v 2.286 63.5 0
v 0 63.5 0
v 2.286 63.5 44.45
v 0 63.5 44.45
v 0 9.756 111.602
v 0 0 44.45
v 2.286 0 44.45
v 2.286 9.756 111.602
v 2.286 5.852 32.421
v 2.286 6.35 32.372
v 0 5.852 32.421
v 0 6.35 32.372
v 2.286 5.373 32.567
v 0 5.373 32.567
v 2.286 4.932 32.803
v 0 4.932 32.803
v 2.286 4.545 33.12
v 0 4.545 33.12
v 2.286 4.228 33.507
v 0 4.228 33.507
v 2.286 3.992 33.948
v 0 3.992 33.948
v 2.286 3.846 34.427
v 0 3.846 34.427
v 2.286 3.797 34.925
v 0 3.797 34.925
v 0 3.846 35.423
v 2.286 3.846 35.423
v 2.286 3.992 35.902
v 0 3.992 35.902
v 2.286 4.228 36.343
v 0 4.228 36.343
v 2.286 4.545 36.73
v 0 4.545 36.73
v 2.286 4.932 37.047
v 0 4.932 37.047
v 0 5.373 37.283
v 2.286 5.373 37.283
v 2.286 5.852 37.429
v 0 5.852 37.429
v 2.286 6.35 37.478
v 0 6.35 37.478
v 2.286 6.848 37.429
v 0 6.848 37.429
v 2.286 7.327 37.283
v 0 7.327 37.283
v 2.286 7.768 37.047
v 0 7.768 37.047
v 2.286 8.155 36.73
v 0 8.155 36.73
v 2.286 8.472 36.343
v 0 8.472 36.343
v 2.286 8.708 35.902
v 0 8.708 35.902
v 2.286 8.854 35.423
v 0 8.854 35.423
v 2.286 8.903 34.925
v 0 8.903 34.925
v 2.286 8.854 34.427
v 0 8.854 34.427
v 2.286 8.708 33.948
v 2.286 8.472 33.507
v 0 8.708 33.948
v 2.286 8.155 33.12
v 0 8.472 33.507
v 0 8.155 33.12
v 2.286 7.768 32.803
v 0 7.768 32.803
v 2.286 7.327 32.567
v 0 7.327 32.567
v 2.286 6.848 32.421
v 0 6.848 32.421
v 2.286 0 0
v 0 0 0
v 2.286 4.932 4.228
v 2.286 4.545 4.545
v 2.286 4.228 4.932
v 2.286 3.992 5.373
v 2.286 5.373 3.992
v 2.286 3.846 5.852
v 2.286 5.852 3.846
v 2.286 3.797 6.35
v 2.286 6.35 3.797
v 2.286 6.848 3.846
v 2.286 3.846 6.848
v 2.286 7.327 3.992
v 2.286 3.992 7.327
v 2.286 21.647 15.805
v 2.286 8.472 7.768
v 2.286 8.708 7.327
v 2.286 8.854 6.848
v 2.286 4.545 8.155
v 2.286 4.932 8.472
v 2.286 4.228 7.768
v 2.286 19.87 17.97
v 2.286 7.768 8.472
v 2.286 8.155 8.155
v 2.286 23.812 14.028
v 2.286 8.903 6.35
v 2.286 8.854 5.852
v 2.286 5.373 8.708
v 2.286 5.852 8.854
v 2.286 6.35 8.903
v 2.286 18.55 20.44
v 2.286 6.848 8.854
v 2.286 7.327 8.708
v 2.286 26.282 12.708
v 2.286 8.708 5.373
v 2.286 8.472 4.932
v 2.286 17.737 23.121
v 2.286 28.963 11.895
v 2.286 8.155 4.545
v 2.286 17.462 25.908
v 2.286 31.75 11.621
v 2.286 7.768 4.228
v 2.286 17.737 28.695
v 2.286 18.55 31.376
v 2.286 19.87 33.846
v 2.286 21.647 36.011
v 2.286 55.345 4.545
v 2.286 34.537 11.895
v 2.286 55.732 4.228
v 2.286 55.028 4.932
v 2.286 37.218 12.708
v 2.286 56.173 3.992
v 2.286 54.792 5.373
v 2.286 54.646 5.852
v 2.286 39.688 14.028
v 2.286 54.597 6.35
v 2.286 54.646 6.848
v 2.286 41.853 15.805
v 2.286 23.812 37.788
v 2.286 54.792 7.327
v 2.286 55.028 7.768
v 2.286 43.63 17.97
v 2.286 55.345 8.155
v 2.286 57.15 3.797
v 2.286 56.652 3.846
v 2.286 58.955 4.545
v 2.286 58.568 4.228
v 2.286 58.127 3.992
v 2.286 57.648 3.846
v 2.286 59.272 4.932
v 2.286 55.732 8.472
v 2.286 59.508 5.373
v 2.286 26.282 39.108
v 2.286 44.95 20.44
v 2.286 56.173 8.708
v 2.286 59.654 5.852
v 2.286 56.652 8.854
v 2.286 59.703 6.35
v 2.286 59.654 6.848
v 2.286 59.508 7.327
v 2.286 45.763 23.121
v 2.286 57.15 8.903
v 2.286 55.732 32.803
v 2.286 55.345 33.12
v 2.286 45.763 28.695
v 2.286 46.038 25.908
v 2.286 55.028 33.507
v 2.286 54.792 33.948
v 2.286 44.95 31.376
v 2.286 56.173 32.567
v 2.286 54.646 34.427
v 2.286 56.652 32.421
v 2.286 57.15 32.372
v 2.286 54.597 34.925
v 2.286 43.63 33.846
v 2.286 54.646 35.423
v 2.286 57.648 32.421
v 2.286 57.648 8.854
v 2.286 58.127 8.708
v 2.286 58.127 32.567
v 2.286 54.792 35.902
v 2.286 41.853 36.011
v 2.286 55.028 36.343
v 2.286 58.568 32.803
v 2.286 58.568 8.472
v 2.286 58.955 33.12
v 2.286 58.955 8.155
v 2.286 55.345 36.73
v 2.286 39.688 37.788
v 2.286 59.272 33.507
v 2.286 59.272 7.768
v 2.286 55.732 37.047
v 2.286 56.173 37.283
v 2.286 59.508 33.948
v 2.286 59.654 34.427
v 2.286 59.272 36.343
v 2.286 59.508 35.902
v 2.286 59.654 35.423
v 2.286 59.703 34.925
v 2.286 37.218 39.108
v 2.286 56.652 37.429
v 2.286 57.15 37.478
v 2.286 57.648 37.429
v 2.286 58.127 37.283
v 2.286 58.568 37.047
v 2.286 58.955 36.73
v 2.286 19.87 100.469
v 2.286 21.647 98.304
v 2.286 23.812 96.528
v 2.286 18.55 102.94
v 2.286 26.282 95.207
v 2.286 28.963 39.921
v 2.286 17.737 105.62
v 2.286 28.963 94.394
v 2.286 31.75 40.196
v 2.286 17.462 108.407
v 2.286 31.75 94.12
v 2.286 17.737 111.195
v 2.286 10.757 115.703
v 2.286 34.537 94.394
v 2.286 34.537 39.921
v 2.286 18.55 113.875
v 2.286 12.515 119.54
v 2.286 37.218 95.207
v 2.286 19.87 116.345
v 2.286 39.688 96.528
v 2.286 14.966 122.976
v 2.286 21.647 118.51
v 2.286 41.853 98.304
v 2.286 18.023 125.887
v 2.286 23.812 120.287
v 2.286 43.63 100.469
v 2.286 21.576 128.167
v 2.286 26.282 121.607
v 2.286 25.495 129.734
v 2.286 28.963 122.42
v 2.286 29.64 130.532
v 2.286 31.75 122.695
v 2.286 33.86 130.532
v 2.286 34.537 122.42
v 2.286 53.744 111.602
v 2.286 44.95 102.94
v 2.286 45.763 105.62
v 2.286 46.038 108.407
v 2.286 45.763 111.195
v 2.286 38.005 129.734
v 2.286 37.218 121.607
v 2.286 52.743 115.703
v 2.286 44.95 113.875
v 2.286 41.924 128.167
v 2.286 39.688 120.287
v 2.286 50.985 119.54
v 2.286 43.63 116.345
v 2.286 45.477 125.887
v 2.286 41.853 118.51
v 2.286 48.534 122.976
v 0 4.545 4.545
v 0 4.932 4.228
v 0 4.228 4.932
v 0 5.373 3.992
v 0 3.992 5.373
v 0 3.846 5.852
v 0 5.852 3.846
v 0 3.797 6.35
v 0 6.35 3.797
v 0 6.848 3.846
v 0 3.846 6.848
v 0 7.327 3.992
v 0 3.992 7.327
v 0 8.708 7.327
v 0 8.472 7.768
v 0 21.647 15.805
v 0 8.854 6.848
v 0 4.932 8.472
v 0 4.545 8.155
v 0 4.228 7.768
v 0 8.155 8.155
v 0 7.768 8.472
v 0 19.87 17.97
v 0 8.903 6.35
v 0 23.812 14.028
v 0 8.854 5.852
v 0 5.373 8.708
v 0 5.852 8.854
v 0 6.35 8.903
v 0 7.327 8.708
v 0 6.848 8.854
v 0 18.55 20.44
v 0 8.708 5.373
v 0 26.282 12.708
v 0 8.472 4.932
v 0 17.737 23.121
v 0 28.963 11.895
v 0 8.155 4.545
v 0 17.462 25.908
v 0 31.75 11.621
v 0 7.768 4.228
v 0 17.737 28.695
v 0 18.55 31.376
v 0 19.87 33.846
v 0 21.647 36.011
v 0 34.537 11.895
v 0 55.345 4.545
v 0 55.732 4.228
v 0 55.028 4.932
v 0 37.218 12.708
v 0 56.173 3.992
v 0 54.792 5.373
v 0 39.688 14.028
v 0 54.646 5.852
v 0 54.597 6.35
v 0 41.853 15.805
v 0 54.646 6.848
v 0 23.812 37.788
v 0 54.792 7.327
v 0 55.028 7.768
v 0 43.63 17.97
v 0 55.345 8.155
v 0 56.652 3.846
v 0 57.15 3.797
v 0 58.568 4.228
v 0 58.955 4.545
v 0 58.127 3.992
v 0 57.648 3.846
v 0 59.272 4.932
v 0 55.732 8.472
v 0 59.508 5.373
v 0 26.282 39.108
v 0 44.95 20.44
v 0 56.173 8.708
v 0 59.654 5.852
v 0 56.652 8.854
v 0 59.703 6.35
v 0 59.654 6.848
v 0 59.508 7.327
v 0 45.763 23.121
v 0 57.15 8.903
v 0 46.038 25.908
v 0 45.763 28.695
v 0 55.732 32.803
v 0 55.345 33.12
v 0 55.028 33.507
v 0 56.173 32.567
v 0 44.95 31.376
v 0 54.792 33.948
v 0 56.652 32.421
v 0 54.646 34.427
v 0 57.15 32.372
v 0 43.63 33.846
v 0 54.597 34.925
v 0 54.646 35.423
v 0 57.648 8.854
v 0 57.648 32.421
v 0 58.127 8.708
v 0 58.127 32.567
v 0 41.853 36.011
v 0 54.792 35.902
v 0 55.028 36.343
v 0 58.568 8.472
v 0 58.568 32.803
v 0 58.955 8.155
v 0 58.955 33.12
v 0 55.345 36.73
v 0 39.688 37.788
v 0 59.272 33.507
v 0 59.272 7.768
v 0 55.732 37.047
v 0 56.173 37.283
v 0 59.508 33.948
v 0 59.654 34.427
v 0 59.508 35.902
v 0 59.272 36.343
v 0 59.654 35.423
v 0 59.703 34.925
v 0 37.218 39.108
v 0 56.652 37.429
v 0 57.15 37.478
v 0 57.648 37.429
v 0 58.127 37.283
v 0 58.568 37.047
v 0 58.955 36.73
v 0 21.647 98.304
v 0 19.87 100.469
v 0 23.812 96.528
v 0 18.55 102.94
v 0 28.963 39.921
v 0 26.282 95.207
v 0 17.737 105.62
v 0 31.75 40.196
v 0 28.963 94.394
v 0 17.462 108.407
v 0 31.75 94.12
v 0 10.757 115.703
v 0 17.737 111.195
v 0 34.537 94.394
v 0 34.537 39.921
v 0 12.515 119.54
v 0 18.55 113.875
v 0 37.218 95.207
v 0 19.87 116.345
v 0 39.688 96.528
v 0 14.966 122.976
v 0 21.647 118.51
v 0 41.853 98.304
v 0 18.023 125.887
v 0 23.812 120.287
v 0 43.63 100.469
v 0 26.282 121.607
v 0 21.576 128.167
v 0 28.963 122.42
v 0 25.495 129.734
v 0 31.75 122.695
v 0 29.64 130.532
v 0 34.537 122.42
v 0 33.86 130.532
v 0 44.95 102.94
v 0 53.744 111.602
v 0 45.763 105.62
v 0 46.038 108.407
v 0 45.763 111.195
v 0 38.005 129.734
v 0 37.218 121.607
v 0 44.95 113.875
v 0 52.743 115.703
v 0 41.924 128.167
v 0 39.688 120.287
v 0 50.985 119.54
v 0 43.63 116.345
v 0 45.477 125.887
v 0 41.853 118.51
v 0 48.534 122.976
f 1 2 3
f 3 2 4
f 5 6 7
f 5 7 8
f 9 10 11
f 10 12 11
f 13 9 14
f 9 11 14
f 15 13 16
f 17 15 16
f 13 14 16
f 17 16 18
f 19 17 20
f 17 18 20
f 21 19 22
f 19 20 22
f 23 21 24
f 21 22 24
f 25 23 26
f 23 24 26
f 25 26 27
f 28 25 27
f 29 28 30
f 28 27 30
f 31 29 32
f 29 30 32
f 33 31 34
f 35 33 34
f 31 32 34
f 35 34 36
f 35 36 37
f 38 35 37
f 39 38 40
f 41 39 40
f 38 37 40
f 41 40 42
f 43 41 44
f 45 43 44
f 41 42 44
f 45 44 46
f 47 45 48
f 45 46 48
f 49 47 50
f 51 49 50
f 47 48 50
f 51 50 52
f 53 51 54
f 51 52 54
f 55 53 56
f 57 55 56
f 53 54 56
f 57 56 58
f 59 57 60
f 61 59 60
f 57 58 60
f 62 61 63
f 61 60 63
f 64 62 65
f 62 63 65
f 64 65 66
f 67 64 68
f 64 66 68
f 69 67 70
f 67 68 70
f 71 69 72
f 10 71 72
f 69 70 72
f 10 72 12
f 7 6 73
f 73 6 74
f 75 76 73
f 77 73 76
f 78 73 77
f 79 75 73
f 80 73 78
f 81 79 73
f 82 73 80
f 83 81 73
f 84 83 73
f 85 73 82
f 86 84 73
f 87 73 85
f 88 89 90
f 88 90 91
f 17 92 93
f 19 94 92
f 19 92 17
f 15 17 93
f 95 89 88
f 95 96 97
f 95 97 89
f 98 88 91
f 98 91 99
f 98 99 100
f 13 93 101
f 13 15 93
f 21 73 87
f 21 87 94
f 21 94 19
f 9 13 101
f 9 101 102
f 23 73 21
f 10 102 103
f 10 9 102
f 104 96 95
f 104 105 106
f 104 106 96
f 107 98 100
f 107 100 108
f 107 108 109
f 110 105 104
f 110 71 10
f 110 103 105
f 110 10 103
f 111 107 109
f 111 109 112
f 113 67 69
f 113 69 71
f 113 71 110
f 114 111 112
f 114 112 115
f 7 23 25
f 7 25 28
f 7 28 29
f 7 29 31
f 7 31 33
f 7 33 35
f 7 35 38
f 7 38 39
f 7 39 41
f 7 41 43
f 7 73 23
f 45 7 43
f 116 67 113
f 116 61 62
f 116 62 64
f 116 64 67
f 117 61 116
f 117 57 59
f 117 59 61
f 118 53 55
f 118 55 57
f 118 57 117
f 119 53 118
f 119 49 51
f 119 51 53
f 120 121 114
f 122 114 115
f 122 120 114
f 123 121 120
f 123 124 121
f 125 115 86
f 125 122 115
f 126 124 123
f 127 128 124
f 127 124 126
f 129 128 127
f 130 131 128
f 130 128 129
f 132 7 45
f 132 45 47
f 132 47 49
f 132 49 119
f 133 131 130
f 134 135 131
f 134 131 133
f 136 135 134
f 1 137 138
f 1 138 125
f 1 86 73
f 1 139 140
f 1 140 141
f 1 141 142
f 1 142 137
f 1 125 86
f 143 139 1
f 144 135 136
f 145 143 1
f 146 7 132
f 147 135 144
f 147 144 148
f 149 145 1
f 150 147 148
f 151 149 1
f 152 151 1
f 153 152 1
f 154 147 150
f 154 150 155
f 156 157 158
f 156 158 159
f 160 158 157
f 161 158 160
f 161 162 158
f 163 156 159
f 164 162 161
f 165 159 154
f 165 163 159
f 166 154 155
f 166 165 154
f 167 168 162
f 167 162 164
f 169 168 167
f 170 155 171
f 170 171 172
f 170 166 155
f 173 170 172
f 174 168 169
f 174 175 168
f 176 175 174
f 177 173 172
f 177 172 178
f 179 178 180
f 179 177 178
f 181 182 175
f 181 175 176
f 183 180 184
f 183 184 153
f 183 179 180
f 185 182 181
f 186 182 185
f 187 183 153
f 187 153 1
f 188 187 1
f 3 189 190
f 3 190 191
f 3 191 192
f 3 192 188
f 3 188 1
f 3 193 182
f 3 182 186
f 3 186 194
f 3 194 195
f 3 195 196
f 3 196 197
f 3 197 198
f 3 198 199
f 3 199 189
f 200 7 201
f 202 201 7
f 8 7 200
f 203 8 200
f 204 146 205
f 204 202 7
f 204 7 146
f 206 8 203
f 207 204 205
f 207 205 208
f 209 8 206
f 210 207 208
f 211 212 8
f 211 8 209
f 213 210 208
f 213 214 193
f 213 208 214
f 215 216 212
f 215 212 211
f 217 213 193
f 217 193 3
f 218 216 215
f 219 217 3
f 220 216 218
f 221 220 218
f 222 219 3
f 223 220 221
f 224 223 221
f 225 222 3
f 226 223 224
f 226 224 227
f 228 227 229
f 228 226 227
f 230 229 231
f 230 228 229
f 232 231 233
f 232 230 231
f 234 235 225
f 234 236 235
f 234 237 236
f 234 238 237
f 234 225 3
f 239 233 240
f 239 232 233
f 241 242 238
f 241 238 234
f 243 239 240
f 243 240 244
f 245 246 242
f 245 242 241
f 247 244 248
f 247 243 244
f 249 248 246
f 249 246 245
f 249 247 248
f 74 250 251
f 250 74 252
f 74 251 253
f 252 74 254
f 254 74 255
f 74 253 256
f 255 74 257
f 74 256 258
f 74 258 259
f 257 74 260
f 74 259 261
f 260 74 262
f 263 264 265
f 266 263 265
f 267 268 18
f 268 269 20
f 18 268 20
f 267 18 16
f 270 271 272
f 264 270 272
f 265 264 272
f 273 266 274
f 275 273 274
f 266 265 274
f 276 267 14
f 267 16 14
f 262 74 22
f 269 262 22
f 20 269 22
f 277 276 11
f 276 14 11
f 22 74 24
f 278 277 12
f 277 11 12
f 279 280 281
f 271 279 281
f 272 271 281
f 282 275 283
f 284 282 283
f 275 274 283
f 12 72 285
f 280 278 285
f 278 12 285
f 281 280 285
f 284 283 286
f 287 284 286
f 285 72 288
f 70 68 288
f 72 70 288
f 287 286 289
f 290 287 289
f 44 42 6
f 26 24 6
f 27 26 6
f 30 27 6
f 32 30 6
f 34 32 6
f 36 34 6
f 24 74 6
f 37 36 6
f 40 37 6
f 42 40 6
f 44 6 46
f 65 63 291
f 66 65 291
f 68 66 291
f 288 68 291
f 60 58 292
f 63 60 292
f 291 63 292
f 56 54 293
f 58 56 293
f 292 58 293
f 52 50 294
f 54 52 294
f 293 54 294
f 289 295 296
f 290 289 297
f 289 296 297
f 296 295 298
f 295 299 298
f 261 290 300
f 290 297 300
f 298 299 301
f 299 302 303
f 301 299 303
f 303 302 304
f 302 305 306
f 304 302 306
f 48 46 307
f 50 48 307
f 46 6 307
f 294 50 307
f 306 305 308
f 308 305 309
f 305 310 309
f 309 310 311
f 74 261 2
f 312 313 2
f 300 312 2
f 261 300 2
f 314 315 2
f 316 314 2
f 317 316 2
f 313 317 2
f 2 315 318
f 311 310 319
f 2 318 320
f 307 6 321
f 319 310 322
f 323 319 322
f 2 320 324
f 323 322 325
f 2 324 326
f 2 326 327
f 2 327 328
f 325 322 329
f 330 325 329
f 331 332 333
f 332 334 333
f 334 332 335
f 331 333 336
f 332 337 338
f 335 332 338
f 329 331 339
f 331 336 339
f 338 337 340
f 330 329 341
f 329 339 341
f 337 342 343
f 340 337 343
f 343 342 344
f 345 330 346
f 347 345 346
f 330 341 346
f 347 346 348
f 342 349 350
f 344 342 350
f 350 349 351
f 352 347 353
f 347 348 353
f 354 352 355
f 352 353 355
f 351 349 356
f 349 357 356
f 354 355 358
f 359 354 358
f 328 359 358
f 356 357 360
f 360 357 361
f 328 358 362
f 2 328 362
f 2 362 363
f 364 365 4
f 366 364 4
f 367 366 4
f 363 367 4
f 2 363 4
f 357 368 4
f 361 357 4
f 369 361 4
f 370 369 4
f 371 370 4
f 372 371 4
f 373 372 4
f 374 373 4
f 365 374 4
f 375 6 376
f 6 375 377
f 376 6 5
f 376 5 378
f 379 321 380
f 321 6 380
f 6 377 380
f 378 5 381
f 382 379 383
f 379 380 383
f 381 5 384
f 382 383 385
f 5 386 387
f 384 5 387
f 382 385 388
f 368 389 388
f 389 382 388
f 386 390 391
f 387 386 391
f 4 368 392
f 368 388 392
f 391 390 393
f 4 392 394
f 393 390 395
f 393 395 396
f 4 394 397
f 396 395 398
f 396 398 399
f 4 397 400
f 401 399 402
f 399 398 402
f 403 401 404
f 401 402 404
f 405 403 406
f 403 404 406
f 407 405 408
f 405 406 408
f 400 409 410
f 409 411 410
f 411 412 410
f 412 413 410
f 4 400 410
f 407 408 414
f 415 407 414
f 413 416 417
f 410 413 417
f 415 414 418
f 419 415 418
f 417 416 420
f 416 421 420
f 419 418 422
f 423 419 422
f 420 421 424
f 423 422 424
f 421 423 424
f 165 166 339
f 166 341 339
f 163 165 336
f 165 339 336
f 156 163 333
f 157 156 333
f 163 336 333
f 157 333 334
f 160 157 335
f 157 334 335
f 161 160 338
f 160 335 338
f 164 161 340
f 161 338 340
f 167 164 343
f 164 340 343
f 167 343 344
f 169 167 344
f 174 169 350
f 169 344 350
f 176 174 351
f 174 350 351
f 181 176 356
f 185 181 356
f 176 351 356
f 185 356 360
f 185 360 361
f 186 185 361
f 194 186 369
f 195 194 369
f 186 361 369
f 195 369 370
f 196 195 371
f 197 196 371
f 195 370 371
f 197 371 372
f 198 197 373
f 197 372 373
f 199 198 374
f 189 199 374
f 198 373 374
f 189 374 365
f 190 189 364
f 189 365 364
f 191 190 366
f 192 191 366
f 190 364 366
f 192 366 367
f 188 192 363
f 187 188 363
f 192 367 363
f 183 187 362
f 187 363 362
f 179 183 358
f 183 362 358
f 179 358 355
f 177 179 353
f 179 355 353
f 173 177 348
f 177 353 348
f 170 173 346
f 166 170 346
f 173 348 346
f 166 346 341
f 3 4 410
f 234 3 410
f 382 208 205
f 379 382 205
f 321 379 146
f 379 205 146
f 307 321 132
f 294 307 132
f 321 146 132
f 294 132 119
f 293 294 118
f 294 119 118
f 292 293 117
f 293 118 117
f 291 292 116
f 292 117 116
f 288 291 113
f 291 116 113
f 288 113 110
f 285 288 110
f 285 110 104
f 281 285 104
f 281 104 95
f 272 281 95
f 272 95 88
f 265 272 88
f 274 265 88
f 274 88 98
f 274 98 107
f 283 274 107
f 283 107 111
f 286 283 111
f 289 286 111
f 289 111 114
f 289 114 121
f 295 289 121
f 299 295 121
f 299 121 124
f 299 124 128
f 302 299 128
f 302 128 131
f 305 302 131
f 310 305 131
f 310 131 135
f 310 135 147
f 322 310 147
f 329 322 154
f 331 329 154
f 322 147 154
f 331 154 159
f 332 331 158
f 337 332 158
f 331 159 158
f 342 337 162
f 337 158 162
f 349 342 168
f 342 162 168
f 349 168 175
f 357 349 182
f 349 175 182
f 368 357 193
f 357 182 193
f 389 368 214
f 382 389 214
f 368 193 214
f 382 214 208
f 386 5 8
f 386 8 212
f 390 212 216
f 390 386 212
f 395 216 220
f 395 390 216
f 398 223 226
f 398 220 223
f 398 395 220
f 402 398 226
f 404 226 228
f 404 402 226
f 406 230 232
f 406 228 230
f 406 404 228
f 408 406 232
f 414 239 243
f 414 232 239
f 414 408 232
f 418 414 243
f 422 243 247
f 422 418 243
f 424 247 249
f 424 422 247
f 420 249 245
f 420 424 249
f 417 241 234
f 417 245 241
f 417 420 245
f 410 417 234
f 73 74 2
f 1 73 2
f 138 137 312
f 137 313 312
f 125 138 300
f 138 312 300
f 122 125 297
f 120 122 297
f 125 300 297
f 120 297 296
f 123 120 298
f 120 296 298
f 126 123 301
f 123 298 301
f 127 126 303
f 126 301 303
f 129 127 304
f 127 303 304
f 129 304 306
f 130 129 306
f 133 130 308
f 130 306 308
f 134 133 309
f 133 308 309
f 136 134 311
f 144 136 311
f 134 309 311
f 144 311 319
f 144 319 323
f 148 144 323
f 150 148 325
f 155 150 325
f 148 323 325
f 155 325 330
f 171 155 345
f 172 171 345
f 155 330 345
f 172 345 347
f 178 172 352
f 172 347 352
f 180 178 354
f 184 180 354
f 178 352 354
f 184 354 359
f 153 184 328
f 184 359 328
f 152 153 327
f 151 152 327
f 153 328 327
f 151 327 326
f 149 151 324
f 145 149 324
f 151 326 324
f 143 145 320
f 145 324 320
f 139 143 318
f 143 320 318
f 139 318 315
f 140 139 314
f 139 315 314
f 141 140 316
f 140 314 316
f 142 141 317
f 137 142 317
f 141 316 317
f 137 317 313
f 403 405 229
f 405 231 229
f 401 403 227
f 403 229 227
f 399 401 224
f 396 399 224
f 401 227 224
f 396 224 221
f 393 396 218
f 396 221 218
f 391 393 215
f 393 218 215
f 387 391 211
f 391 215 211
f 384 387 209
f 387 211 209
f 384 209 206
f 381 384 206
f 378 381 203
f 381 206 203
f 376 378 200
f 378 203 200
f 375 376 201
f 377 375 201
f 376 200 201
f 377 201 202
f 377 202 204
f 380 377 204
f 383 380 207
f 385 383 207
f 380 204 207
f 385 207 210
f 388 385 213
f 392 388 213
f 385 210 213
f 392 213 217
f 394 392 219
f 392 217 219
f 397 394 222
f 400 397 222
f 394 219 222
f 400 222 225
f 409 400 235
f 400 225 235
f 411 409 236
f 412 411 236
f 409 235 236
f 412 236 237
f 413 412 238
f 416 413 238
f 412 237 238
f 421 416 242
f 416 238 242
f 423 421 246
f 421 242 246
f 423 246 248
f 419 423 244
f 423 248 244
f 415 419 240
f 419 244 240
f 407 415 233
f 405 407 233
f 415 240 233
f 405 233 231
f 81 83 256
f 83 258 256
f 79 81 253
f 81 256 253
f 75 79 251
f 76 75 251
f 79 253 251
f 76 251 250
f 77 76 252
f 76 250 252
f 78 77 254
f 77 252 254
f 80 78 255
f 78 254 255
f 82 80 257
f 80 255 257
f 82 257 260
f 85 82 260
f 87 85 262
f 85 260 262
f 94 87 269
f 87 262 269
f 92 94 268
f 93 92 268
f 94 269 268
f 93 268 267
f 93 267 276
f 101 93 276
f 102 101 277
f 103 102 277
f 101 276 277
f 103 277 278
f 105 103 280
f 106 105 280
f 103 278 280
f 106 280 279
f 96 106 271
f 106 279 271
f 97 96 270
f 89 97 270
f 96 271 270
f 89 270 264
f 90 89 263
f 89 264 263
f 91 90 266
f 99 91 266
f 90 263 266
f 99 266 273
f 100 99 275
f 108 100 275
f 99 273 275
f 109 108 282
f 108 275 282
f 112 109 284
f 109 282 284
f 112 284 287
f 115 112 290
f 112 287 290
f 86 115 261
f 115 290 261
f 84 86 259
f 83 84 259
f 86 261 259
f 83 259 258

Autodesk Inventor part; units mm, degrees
ref_plane "YZ Plane" through (0, 0, 0) normal (1, 0, 0) x (0, 1, 0)
ref_plane "XZ Plane" through (0, 0, 0) normal (0, 1, 0) x (-1, 0, 0)
ref_plane "XY Plane" through (0, 0, 0) normal (0, 0, 1) x (1, 0, 0)
sketch "Sketch1" plane through (0, 0, 0) normal (1, 0, 0) x (0, 1, 0)
  line L0 (0, 0) -> (63.5, 0)
  line L1 (63.5, 0) -> (63.5, 44.45)
  line L2 (0, 44.45) -> (0, 0)
  line L3 (31.75, 139.6202) -> (31.75, -24.2766) construction
  arc A0 (53.7441, 111.6025) -> (9.7559, 111.6025) centre (31.75, 108.4072) ccw
  line L4 (63.5, 44.45) -> (53.7441, 111.6025)
  line L5 (0, 44.45) -> (9.7559, 111.6025)
  line L6 (0, 22.225) -> (-15.9644, 22.225)
  point P0 (31.75, 25.908)
  dimension "d0" = 63.5
  dimension "d1" = 44.45
  dimension "d3" = 31.75
  dimension "d5" = 44.45
  dimension "d21" = 82.4992
  dimension "d22" = 63.9572
  dimension "d40" = 25.908
extrude "Extrusion1" add sketch "Sketch1" along normal blind 2.286
hole "Hole2" at (0, 31.75, 108.4072) at (0, 31.75, 25.908) direction (1, 0, 0) diameter 28.575 end through all
sketch "Sketch2" plane through (2.286, 0, 0) normal (1, 0, 0) x (0, 0, -1)
  line L0 (0, 63.5) -> (-44.45, 63.5) projected
  line L1 (-12.7, -16.6387) -> (-12.7, 68.9005) construction
  line L2 (0, 0) -> (0, 63.5) construction
  circle A0 centre (-25.908, 31.75) radius 14.2875 projected
  circle A1 centre (-25.908, 31.75) radius 22.0437
  circle A2 centre (-6.35, 57.15) radius 4.5847
  line L3 (-0.8507, 57.15) -> (-3.6004, 52.3875)
  line L4 (-3.6004, 52.3875) -> (-9.0996, 52.3875)
  line L5 (-9.0996, 52.3875) -> (-11.8493, 57.15)
  line L6 (-11.8493, 57.15) -> (-9.0996, 61.9125)
  line L7 (-9.0996, 61.9125) -> (-3.6004, 61.9125)
  line L8 (-3.6004, 61.9125) -> (-0.8507, 57.15)
  circle A3 centre (-34.925, 57.15) radius 4.5847
  line L9 (-29.631, 57.15) -> (-32.278, 52.5653)
  line L10 (-32.278, 52.5653) -> (-37.572, 52.5653)
  line L11 (-37.572, 52.5653) -> (-40.219, 57.15)
  line L12 (-40.219, 57.15) -> (-37.572, 61.7347)
  line L13 (-37.572, 61.7347) -> (-32.278, 61.7347)
  line L14 (-32.278, 61.7347) -> (-29.631, 57.15)
  point P0 (-6.35, 6.35)
  point P1 (-34.925, 6.35)
  dimension "d33" = 9.1694
  dimension "d35" = 9.525
  dimension "d37" = 25.4
  dimension "d39" = 25.4
  dimension "d41" = 9.525
  dimension "d42" = 38.1
hole "Hole1" at (2.286, 57.15, 34.925) at (2.286, 57.15, 6.35) at (2.286, 6.35, 34.925) at (2.286, 6.35, 6.35) direction (-1, 0, 0) diameter 5.1054 end through all clearance for "Flat Head Machine Screw (82)" size "#10" standard "Ansi Unified Screw Threads"
equation "\"d3\" = 0.5 * d0"
equation "\"d39\" = d37"
properties part number "CAR_041_KickerGusset" material "Aluminum 6061"
